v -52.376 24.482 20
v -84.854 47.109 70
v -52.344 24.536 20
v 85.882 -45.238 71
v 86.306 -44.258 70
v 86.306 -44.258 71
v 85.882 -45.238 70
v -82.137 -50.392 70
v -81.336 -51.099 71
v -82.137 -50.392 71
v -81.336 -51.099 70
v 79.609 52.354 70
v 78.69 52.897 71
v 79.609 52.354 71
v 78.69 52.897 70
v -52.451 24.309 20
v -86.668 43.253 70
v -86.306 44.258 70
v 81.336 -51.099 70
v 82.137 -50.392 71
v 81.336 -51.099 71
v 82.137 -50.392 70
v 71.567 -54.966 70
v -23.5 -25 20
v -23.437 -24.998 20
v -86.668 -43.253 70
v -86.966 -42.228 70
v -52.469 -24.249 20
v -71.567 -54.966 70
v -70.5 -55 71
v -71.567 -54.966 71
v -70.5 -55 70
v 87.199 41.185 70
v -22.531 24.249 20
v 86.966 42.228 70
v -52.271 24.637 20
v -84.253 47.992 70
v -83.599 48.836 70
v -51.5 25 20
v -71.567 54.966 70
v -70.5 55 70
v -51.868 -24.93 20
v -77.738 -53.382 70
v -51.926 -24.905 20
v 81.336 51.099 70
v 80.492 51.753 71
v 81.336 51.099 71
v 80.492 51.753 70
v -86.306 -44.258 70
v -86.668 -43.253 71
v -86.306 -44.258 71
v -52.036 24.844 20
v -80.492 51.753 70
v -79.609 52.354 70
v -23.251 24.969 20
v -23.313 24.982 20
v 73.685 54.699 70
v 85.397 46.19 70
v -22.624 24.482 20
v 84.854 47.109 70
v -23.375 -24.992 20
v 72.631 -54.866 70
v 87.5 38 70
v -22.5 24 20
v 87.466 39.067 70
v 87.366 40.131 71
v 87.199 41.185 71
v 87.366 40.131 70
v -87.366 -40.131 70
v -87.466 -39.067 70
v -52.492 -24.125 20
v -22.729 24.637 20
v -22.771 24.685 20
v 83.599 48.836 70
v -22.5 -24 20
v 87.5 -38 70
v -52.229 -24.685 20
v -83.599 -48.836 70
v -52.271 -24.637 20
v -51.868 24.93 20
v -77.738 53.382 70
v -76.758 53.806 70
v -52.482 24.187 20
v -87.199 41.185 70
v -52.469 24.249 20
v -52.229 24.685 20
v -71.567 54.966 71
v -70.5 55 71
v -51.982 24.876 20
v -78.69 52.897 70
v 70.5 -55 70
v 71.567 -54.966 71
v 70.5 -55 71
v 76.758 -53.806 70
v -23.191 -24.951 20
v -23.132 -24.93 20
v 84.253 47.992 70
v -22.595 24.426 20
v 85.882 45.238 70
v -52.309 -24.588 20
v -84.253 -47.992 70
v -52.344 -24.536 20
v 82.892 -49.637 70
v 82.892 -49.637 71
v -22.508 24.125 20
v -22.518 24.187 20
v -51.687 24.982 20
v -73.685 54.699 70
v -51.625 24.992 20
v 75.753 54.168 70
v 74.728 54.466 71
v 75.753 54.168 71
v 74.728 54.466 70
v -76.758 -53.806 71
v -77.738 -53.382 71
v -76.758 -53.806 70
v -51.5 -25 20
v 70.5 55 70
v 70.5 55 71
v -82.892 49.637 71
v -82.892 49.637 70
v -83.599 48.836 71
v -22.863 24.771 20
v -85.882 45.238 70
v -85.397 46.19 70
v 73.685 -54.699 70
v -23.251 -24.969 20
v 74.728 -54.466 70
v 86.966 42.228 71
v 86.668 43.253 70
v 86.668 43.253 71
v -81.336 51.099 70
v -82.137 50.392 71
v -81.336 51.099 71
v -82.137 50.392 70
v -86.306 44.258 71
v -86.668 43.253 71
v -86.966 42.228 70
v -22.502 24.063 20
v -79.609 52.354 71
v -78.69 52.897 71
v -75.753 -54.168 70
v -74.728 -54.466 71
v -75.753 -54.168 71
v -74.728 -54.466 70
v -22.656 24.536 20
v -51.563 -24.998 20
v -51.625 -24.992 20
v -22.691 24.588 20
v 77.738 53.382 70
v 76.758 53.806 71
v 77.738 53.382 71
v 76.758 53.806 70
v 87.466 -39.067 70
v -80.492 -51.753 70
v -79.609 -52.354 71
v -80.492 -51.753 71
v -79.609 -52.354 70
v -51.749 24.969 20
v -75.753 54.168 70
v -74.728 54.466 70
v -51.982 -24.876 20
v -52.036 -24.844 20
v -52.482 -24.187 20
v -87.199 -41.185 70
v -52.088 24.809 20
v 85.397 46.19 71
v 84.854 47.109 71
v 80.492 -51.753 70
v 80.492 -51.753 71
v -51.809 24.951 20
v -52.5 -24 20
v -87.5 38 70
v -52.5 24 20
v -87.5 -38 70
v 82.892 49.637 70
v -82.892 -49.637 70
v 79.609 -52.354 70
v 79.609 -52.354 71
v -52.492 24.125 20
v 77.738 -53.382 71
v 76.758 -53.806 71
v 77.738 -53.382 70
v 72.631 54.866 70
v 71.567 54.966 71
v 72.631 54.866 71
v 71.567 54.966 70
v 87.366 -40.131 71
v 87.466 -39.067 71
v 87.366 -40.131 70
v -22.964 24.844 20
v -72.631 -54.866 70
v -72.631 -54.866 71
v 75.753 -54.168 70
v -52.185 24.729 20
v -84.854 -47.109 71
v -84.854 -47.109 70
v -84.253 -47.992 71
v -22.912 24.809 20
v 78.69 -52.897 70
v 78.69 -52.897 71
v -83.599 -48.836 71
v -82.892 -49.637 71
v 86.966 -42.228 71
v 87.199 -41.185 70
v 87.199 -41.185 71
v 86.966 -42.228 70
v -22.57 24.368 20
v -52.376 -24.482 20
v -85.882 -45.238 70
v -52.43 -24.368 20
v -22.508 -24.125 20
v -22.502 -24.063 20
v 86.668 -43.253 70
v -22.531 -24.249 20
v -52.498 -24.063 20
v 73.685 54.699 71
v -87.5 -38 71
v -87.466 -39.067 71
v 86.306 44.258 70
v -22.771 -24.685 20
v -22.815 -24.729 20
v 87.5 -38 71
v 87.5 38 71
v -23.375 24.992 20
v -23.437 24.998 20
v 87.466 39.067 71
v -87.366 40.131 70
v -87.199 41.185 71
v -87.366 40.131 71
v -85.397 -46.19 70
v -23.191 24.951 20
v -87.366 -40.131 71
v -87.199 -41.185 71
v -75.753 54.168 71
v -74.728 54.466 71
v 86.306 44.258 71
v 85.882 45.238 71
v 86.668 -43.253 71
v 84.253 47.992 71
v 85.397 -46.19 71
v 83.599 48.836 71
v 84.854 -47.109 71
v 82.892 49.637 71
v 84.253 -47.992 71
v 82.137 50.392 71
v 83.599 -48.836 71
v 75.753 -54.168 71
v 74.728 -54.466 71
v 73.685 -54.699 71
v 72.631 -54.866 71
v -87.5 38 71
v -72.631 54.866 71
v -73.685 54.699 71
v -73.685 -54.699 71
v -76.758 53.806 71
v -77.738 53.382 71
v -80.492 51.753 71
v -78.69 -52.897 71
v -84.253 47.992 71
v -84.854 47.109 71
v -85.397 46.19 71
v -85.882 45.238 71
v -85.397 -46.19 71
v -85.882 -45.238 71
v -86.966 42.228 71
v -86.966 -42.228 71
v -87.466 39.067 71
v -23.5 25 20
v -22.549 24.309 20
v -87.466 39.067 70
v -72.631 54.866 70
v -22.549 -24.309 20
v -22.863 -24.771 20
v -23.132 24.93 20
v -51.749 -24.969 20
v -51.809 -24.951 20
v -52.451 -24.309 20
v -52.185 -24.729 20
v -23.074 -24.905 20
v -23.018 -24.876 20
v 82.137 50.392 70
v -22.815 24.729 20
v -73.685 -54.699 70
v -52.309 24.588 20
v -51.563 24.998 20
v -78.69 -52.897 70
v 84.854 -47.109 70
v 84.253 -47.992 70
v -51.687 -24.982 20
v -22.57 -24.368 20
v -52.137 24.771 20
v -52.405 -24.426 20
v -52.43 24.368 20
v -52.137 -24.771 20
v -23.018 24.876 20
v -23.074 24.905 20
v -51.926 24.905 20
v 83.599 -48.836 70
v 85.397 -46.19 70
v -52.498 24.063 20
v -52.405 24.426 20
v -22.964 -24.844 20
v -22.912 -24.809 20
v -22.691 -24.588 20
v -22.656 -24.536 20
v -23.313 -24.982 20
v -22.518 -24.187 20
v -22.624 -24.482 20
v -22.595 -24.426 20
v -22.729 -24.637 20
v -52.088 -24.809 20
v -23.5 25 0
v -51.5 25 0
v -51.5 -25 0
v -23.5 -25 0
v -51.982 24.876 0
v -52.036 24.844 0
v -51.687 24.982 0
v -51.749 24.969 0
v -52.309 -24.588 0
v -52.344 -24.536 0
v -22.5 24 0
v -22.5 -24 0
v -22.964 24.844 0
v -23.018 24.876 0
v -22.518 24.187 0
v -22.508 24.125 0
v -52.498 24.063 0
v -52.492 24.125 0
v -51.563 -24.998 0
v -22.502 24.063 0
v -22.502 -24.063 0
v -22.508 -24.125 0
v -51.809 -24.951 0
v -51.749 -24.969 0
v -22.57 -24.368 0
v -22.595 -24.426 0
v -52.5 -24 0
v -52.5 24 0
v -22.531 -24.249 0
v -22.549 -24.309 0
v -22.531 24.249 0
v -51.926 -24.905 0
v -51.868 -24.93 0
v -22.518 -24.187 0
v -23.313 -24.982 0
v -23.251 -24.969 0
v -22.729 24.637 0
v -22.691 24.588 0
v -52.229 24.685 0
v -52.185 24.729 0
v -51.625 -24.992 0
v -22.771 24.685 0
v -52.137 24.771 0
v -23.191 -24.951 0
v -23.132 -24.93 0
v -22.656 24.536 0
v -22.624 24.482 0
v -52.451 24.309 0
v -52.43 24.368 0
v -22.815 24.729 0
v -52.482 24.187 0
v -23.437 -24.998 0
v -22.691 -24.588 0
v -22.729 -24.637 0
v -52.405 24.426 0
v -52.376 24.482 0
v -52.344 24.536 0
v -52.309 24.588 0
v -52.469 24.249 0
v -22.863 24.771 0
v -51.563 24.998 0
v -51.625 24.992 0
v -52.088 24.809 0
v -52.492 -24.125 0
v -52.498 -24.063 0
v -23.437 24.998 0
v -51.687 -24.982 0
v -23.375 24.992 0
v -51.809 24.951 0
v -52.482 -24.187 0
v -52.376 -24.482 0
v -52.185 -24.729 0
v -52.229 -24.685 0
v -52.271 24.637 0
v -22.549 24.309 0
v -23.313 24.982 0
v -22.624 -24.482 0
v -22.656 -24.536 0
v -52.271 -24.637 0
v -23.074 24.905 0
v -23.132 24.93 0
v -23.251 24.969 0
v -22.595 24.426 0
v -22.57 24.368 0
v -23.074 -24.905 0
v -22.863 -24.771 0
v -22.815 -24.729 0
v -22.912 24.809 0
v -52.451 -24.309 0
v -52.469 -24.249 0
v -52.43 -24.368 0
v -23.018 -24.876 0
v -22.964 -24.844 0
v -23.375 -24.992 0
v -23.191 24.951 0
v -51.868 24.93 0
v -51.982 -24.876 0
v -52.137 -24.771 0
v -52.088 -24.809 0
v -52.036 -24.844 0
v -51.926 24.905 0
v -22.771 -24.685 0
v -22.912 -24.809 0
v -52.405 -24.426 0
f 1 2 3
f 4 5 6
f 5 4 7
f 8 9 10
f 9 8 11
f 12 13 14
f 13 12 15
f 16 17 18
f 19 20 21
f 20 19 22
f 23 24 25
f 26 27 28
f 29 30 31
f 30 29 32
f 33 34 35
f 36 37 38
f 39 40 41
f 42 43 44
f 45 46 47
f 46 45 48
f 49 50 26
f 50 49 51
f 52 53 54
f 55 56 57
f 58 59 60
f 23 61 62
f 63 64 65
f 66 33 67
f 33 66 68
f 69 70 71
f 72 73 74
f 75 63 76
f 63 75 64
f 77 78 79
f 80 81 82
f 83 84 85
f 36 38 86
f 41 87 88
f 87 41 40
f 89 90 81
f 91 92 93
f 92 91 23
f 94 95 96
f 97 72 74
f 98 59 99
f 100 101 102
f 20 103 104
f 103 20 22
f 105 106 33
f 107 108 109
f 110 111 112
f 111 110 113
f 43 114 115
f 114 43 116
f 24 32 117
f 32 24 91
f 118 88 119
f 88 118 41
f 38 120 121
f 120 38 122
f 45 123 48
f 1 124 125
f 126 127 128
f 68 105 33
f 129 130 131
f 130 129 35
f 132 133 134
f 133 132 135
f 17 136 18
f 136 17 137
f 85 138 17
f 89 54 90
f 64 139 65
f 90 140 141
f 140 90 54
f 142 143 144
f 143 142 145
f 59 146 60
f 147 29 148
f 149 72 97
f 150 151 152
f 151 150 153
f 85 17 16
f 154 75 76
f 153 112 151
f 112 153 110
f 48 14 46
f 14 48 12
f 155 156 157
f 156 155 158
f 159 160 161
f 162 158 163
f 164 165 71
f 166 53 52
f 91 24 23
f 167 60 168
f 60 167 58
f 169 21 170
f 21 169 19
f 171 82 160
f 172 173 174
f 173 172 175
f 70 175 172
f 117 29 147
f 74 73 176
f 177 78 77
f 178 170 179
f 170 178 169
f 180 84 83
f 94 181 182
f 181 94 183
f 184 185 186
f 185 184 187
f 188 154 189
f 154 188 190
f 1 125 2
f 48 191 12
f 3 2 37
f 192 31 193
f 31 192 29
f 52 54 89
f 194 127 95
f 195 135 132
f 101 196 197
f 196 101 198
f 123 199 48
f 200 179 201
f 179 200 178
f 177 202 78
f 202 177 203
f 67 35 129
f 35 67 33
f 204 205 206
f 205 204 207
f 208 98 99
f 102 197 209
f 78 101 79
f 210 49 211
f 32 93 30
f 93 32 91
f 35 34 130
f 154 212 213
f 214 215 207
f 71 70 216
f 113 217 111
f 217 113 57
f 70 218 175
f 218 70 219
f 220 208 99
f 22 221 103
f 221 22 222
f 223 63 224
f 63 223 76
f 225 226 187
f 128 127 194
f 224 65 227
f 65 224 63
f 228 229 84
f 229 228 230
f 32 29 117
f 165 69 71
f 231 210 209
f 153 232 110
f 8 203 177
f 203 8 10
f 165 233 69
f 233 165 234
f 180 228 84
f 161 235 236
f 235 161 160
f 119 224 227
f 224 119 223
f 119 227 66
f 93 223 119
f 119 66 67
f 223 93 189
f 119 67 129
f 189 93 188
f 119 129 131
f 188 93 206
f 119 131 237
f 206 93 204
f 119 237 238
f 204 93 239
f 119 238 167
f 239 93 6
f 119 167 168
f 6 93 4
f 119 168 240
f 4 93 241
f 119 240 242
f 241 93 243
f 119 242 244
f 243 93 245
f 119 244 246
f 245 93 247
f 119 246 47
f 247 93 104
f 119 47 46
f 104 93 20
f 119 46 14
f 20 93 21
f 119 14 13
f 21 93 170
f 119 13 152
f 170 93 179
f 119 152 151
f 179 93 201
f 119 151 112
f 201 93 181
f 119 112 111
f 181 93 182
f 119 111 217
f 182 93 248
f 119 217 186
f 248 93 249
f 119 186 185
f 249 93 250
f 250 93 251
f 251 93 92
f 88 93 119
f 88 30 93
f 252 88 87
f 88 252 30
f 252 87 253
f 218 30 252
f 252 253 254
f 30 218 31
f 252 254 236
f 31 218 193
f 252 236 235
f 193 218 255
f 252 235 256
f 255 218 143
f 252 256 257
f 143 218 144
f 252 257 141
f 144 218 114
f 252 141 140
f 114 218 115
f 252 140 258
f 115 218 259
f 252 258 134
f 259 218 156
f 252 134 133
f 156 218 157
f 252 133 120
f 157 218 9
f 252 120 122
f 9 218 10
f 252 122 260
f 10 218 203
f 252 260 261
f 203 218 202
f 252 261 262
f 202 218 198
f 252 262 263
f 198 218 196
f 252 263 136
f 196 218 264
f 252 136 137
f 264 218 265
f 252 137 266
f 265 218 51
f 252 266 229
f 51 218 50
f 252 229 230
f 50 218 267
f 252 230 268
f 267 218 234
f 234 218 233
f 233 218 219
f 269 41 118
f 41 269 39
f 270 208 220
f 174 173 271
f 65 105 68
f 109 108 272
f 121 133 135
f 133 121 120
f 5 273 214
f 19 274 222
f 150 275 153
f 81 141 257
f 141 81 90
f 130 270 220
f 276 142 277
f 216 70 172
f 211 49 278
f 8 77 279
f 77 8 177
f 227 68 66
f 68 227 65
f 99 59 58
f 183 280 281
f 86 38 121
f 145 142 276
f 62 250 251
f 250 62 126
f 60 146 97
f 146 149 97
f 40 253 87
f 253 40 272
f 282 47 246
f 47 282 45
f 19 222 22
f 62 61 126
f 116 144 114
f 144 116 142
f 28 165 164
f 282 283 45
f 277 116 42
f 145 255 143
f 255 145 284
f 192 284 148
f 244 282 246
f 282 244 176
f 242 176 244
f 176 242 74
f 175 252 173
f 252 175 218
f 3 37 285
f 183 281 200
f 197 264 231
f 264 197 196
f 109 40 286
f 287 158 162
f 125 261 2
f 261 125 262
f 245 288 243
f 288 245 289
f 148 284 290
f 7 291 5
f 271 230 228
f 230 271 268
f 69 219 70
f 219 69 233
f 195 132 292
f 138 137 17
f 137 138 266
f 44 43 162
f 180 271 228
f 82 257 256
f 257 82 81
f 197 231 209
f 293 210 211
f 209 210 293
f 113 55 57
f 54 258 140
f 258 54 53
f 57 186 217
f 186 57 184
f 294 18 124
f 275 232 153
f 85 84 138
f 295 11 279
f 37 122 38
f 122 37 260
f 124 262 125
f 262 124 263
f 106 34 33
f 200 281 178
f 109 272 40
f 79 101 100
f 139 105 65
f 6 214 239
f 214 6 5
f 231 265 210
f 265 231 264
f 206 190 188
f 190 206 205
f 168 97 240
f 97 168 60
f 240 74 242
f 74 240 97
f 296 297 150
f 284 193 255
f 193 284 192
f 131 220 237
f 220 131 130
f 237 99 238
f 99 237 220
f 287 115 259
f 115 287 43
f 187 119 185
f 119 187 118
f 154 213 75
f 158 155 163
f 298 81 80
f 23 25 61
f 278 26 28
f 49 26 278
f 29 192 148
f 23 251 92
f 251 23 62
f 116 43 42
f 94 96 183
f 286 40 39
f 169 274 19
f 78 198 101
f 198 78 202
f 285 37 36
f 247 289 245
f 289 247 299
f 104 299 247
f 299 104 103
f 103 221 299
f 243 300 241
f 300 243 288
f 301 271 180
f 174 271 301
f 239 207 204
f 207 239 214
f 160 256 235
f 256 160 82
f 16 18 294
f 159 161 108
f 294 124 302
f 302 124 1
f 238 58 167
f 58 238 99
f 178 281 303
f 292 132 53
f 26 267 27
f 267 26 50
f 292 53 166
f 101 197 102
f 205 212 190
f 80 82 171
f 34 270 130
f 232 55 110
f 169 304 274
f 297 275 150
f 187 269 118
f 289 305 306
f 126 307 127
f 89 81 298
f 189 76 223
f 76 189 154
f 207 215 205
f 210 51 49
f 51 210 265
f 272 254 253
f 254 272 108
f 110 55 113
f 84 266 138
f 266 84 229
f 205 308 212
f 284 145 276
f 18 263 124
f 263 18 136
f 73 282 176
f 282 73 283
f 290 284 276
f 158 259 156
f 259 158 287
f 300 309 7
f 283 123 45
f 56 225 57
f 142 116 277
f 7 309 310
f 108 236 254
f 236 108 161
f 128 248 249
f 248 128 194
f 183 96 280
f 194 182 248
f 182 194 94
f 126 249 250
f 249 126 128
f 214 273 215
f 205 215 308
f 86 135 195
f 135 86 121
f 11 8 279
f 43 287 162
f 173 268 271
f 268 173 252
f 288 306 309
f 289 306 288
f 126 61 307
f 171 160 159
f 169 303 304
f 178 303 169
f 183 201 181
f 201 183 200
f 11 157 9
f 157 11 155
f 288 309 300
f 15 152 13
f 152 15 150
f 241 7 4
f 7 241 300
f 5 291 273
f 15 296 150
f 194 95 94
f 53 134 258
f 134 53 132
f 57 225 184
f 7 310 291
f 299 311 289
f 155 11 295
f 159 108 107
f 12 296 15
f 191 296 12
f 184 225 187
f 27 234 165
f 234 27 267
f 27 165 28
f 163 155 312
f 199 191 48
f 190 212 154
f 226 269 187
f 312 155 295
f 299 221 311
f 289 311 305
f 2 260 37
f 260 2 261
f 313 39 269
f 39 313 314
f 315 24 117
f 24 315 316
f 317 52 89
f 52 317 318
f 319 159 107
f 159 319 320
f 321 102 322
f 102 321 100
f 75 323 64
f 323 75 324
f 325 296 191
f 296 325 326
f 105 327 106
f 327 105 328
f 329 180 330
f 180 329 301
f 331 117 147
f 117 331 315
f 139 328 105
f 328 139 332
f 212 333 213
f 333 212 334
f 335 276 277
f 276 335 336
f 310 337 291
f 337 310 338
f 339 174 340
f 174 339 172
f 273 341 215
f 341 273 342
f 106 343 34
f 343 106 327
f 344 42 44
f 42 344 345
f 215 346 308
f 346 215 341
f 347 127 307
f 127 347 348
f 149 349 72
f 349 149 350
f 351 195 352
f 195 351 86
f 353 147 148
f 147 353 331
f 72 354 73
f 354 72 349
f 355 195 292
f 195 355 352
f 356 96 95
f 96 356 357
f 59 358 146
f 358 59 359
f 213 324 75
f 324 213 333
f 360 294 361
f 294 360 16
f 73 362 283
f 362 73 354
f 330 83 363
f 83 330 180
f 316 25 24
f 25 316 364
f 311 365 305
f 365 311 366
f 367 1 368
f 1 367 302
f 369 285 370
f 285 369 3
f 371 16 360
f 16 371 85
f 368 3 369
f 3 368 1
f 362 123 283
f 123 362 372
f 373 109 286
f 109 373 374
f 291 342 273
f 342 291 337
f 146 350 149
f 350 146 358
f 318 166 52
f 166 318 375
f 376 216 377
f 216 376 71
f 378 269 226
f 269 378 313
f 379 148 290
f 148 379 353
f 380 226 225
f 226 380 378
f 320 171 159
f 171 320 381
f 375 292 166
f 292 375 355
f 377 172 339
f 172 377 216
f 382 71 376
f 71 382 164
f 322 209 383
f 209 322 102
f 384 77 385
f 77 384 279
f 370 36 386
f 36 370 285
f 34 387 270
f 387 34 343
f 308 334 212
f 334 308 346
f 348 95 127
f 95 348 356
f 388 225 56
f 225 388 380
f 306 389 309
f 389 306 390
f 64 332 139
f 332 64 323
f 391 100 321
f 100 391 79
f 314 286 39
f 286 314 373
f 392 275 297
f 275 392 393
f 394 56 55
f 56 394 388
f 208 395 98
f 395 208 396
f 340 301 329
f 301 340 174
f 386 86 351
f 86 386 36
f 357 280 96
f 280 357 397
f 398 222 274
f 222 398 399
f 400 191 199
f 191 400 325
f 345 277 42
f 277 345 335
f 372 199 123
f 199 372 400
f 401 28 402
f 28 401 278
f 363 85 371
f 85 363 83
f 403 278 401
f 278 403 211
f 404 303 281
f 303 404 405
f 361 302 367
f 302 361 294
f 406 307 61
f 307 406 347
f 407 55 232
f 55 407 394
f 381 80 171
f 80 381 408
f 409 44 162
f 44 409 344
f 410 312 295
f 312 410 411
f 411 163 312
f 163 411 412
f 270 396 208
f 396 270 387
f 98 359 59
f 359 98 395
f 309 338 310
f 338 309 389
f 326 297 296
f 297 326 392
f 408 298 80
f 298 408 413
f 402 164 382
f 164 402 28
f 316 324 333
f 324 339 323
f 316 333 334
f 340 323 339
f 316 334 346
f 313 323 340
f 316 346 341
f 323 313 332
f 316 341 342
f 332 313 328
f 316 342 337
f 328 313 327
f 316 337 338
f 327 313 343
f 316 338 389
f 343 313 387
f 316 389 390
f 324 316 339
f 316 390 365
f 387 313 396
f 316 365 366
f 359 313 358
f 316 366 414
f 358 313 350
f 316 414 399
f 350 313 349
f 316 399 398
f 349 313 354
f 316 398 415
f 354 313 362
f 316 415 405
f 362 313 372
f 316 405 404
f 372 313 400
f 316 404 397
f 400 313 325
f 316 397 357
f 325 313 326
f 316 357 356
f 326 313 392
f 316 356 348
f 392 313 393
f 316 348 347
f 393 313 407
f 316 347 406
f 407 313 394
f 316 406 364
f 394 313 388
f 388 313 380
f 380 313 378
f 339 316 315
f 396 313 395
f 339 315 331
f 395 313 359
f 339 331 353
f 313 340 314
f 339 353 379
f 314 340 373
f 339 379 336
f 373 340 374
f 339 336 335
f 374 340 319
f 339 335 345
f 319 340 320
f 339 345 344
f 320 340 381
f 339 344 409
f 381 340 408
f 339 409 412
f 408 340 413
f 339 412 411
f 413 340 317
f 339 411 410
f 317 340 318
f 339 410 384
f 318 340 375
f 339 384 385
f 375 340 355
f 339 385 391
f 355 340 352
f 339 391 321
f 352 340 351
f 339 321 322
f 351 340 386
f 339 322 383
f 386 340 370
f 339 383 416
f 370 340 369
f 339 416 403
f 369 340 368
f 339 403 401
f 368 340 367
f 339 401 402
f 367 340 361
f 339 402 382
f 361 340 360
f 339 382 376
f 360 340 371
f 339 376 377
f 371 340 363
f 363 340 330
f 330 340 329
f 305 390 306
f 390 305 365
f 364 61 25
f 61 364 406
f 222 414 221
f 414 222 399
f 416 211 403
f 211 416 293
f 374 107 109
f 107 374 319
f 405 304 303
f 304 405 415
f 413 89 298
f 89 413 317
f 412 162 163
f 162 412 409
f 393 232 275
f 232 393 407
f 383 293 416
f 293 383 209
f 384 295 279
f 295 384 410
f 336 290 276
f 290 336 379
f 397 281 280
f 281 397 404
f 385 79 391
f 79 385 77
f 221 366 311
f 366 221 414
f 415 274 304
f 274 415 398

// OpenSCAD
OUTPORT_LENGTH = 50;
OUTPORT_WIDTH = 30;
OUTPORT_CORNER_DIA = 2;
OUTPORT_HEIGHT = 20;
OUTPORT_OFFSET = 50;

INPORT_LENGTH = 110;
INPORT_WIDTH = 175;
INPORT_CORNER_DIA = 34;

HEIGHT = 50;

$fn = 100;

module rounded_rect(width, length, height, corner_dia) {
  hull() {
    for(i = [-1, 1]) {
      for(j = [-1, 1]) {
        translate([i * (width - corner_dia)/2, j * (length - corner_dia)/2, 0])
        cylinder(d = corner_dia, h = height);
      }
    }
  }
}

module funnel() {
  union() {
    hull() {
      translate([0, 0, HEIGHT + OUTPORT_HEIGHT])
      rounded_rect(INPORT_WIDTH, INPORT_LENGTH, 1, INPORT_CORNER_DIA);
      translate([-(INPORT_WIDTH/2 - OUTPORT_OFFSET), 0, OUTPORT_HEIGHT])
      rounded_rect(OUTPORT_WIDTH, OUTPORT_LENGTH, 1, OUTPORT_CORNER_DIA);
    }
    translate([-(INPORT_WIDTH/2 - OUTPORT_OFFSET), 0, 0])
    rounded_rect(OUTPORT_WIDTH, OUTPORT_LENGTH, OUTPORT_HEIGHT, OUTPORT_CORNER_DIA);    
  }
}

funnel();
